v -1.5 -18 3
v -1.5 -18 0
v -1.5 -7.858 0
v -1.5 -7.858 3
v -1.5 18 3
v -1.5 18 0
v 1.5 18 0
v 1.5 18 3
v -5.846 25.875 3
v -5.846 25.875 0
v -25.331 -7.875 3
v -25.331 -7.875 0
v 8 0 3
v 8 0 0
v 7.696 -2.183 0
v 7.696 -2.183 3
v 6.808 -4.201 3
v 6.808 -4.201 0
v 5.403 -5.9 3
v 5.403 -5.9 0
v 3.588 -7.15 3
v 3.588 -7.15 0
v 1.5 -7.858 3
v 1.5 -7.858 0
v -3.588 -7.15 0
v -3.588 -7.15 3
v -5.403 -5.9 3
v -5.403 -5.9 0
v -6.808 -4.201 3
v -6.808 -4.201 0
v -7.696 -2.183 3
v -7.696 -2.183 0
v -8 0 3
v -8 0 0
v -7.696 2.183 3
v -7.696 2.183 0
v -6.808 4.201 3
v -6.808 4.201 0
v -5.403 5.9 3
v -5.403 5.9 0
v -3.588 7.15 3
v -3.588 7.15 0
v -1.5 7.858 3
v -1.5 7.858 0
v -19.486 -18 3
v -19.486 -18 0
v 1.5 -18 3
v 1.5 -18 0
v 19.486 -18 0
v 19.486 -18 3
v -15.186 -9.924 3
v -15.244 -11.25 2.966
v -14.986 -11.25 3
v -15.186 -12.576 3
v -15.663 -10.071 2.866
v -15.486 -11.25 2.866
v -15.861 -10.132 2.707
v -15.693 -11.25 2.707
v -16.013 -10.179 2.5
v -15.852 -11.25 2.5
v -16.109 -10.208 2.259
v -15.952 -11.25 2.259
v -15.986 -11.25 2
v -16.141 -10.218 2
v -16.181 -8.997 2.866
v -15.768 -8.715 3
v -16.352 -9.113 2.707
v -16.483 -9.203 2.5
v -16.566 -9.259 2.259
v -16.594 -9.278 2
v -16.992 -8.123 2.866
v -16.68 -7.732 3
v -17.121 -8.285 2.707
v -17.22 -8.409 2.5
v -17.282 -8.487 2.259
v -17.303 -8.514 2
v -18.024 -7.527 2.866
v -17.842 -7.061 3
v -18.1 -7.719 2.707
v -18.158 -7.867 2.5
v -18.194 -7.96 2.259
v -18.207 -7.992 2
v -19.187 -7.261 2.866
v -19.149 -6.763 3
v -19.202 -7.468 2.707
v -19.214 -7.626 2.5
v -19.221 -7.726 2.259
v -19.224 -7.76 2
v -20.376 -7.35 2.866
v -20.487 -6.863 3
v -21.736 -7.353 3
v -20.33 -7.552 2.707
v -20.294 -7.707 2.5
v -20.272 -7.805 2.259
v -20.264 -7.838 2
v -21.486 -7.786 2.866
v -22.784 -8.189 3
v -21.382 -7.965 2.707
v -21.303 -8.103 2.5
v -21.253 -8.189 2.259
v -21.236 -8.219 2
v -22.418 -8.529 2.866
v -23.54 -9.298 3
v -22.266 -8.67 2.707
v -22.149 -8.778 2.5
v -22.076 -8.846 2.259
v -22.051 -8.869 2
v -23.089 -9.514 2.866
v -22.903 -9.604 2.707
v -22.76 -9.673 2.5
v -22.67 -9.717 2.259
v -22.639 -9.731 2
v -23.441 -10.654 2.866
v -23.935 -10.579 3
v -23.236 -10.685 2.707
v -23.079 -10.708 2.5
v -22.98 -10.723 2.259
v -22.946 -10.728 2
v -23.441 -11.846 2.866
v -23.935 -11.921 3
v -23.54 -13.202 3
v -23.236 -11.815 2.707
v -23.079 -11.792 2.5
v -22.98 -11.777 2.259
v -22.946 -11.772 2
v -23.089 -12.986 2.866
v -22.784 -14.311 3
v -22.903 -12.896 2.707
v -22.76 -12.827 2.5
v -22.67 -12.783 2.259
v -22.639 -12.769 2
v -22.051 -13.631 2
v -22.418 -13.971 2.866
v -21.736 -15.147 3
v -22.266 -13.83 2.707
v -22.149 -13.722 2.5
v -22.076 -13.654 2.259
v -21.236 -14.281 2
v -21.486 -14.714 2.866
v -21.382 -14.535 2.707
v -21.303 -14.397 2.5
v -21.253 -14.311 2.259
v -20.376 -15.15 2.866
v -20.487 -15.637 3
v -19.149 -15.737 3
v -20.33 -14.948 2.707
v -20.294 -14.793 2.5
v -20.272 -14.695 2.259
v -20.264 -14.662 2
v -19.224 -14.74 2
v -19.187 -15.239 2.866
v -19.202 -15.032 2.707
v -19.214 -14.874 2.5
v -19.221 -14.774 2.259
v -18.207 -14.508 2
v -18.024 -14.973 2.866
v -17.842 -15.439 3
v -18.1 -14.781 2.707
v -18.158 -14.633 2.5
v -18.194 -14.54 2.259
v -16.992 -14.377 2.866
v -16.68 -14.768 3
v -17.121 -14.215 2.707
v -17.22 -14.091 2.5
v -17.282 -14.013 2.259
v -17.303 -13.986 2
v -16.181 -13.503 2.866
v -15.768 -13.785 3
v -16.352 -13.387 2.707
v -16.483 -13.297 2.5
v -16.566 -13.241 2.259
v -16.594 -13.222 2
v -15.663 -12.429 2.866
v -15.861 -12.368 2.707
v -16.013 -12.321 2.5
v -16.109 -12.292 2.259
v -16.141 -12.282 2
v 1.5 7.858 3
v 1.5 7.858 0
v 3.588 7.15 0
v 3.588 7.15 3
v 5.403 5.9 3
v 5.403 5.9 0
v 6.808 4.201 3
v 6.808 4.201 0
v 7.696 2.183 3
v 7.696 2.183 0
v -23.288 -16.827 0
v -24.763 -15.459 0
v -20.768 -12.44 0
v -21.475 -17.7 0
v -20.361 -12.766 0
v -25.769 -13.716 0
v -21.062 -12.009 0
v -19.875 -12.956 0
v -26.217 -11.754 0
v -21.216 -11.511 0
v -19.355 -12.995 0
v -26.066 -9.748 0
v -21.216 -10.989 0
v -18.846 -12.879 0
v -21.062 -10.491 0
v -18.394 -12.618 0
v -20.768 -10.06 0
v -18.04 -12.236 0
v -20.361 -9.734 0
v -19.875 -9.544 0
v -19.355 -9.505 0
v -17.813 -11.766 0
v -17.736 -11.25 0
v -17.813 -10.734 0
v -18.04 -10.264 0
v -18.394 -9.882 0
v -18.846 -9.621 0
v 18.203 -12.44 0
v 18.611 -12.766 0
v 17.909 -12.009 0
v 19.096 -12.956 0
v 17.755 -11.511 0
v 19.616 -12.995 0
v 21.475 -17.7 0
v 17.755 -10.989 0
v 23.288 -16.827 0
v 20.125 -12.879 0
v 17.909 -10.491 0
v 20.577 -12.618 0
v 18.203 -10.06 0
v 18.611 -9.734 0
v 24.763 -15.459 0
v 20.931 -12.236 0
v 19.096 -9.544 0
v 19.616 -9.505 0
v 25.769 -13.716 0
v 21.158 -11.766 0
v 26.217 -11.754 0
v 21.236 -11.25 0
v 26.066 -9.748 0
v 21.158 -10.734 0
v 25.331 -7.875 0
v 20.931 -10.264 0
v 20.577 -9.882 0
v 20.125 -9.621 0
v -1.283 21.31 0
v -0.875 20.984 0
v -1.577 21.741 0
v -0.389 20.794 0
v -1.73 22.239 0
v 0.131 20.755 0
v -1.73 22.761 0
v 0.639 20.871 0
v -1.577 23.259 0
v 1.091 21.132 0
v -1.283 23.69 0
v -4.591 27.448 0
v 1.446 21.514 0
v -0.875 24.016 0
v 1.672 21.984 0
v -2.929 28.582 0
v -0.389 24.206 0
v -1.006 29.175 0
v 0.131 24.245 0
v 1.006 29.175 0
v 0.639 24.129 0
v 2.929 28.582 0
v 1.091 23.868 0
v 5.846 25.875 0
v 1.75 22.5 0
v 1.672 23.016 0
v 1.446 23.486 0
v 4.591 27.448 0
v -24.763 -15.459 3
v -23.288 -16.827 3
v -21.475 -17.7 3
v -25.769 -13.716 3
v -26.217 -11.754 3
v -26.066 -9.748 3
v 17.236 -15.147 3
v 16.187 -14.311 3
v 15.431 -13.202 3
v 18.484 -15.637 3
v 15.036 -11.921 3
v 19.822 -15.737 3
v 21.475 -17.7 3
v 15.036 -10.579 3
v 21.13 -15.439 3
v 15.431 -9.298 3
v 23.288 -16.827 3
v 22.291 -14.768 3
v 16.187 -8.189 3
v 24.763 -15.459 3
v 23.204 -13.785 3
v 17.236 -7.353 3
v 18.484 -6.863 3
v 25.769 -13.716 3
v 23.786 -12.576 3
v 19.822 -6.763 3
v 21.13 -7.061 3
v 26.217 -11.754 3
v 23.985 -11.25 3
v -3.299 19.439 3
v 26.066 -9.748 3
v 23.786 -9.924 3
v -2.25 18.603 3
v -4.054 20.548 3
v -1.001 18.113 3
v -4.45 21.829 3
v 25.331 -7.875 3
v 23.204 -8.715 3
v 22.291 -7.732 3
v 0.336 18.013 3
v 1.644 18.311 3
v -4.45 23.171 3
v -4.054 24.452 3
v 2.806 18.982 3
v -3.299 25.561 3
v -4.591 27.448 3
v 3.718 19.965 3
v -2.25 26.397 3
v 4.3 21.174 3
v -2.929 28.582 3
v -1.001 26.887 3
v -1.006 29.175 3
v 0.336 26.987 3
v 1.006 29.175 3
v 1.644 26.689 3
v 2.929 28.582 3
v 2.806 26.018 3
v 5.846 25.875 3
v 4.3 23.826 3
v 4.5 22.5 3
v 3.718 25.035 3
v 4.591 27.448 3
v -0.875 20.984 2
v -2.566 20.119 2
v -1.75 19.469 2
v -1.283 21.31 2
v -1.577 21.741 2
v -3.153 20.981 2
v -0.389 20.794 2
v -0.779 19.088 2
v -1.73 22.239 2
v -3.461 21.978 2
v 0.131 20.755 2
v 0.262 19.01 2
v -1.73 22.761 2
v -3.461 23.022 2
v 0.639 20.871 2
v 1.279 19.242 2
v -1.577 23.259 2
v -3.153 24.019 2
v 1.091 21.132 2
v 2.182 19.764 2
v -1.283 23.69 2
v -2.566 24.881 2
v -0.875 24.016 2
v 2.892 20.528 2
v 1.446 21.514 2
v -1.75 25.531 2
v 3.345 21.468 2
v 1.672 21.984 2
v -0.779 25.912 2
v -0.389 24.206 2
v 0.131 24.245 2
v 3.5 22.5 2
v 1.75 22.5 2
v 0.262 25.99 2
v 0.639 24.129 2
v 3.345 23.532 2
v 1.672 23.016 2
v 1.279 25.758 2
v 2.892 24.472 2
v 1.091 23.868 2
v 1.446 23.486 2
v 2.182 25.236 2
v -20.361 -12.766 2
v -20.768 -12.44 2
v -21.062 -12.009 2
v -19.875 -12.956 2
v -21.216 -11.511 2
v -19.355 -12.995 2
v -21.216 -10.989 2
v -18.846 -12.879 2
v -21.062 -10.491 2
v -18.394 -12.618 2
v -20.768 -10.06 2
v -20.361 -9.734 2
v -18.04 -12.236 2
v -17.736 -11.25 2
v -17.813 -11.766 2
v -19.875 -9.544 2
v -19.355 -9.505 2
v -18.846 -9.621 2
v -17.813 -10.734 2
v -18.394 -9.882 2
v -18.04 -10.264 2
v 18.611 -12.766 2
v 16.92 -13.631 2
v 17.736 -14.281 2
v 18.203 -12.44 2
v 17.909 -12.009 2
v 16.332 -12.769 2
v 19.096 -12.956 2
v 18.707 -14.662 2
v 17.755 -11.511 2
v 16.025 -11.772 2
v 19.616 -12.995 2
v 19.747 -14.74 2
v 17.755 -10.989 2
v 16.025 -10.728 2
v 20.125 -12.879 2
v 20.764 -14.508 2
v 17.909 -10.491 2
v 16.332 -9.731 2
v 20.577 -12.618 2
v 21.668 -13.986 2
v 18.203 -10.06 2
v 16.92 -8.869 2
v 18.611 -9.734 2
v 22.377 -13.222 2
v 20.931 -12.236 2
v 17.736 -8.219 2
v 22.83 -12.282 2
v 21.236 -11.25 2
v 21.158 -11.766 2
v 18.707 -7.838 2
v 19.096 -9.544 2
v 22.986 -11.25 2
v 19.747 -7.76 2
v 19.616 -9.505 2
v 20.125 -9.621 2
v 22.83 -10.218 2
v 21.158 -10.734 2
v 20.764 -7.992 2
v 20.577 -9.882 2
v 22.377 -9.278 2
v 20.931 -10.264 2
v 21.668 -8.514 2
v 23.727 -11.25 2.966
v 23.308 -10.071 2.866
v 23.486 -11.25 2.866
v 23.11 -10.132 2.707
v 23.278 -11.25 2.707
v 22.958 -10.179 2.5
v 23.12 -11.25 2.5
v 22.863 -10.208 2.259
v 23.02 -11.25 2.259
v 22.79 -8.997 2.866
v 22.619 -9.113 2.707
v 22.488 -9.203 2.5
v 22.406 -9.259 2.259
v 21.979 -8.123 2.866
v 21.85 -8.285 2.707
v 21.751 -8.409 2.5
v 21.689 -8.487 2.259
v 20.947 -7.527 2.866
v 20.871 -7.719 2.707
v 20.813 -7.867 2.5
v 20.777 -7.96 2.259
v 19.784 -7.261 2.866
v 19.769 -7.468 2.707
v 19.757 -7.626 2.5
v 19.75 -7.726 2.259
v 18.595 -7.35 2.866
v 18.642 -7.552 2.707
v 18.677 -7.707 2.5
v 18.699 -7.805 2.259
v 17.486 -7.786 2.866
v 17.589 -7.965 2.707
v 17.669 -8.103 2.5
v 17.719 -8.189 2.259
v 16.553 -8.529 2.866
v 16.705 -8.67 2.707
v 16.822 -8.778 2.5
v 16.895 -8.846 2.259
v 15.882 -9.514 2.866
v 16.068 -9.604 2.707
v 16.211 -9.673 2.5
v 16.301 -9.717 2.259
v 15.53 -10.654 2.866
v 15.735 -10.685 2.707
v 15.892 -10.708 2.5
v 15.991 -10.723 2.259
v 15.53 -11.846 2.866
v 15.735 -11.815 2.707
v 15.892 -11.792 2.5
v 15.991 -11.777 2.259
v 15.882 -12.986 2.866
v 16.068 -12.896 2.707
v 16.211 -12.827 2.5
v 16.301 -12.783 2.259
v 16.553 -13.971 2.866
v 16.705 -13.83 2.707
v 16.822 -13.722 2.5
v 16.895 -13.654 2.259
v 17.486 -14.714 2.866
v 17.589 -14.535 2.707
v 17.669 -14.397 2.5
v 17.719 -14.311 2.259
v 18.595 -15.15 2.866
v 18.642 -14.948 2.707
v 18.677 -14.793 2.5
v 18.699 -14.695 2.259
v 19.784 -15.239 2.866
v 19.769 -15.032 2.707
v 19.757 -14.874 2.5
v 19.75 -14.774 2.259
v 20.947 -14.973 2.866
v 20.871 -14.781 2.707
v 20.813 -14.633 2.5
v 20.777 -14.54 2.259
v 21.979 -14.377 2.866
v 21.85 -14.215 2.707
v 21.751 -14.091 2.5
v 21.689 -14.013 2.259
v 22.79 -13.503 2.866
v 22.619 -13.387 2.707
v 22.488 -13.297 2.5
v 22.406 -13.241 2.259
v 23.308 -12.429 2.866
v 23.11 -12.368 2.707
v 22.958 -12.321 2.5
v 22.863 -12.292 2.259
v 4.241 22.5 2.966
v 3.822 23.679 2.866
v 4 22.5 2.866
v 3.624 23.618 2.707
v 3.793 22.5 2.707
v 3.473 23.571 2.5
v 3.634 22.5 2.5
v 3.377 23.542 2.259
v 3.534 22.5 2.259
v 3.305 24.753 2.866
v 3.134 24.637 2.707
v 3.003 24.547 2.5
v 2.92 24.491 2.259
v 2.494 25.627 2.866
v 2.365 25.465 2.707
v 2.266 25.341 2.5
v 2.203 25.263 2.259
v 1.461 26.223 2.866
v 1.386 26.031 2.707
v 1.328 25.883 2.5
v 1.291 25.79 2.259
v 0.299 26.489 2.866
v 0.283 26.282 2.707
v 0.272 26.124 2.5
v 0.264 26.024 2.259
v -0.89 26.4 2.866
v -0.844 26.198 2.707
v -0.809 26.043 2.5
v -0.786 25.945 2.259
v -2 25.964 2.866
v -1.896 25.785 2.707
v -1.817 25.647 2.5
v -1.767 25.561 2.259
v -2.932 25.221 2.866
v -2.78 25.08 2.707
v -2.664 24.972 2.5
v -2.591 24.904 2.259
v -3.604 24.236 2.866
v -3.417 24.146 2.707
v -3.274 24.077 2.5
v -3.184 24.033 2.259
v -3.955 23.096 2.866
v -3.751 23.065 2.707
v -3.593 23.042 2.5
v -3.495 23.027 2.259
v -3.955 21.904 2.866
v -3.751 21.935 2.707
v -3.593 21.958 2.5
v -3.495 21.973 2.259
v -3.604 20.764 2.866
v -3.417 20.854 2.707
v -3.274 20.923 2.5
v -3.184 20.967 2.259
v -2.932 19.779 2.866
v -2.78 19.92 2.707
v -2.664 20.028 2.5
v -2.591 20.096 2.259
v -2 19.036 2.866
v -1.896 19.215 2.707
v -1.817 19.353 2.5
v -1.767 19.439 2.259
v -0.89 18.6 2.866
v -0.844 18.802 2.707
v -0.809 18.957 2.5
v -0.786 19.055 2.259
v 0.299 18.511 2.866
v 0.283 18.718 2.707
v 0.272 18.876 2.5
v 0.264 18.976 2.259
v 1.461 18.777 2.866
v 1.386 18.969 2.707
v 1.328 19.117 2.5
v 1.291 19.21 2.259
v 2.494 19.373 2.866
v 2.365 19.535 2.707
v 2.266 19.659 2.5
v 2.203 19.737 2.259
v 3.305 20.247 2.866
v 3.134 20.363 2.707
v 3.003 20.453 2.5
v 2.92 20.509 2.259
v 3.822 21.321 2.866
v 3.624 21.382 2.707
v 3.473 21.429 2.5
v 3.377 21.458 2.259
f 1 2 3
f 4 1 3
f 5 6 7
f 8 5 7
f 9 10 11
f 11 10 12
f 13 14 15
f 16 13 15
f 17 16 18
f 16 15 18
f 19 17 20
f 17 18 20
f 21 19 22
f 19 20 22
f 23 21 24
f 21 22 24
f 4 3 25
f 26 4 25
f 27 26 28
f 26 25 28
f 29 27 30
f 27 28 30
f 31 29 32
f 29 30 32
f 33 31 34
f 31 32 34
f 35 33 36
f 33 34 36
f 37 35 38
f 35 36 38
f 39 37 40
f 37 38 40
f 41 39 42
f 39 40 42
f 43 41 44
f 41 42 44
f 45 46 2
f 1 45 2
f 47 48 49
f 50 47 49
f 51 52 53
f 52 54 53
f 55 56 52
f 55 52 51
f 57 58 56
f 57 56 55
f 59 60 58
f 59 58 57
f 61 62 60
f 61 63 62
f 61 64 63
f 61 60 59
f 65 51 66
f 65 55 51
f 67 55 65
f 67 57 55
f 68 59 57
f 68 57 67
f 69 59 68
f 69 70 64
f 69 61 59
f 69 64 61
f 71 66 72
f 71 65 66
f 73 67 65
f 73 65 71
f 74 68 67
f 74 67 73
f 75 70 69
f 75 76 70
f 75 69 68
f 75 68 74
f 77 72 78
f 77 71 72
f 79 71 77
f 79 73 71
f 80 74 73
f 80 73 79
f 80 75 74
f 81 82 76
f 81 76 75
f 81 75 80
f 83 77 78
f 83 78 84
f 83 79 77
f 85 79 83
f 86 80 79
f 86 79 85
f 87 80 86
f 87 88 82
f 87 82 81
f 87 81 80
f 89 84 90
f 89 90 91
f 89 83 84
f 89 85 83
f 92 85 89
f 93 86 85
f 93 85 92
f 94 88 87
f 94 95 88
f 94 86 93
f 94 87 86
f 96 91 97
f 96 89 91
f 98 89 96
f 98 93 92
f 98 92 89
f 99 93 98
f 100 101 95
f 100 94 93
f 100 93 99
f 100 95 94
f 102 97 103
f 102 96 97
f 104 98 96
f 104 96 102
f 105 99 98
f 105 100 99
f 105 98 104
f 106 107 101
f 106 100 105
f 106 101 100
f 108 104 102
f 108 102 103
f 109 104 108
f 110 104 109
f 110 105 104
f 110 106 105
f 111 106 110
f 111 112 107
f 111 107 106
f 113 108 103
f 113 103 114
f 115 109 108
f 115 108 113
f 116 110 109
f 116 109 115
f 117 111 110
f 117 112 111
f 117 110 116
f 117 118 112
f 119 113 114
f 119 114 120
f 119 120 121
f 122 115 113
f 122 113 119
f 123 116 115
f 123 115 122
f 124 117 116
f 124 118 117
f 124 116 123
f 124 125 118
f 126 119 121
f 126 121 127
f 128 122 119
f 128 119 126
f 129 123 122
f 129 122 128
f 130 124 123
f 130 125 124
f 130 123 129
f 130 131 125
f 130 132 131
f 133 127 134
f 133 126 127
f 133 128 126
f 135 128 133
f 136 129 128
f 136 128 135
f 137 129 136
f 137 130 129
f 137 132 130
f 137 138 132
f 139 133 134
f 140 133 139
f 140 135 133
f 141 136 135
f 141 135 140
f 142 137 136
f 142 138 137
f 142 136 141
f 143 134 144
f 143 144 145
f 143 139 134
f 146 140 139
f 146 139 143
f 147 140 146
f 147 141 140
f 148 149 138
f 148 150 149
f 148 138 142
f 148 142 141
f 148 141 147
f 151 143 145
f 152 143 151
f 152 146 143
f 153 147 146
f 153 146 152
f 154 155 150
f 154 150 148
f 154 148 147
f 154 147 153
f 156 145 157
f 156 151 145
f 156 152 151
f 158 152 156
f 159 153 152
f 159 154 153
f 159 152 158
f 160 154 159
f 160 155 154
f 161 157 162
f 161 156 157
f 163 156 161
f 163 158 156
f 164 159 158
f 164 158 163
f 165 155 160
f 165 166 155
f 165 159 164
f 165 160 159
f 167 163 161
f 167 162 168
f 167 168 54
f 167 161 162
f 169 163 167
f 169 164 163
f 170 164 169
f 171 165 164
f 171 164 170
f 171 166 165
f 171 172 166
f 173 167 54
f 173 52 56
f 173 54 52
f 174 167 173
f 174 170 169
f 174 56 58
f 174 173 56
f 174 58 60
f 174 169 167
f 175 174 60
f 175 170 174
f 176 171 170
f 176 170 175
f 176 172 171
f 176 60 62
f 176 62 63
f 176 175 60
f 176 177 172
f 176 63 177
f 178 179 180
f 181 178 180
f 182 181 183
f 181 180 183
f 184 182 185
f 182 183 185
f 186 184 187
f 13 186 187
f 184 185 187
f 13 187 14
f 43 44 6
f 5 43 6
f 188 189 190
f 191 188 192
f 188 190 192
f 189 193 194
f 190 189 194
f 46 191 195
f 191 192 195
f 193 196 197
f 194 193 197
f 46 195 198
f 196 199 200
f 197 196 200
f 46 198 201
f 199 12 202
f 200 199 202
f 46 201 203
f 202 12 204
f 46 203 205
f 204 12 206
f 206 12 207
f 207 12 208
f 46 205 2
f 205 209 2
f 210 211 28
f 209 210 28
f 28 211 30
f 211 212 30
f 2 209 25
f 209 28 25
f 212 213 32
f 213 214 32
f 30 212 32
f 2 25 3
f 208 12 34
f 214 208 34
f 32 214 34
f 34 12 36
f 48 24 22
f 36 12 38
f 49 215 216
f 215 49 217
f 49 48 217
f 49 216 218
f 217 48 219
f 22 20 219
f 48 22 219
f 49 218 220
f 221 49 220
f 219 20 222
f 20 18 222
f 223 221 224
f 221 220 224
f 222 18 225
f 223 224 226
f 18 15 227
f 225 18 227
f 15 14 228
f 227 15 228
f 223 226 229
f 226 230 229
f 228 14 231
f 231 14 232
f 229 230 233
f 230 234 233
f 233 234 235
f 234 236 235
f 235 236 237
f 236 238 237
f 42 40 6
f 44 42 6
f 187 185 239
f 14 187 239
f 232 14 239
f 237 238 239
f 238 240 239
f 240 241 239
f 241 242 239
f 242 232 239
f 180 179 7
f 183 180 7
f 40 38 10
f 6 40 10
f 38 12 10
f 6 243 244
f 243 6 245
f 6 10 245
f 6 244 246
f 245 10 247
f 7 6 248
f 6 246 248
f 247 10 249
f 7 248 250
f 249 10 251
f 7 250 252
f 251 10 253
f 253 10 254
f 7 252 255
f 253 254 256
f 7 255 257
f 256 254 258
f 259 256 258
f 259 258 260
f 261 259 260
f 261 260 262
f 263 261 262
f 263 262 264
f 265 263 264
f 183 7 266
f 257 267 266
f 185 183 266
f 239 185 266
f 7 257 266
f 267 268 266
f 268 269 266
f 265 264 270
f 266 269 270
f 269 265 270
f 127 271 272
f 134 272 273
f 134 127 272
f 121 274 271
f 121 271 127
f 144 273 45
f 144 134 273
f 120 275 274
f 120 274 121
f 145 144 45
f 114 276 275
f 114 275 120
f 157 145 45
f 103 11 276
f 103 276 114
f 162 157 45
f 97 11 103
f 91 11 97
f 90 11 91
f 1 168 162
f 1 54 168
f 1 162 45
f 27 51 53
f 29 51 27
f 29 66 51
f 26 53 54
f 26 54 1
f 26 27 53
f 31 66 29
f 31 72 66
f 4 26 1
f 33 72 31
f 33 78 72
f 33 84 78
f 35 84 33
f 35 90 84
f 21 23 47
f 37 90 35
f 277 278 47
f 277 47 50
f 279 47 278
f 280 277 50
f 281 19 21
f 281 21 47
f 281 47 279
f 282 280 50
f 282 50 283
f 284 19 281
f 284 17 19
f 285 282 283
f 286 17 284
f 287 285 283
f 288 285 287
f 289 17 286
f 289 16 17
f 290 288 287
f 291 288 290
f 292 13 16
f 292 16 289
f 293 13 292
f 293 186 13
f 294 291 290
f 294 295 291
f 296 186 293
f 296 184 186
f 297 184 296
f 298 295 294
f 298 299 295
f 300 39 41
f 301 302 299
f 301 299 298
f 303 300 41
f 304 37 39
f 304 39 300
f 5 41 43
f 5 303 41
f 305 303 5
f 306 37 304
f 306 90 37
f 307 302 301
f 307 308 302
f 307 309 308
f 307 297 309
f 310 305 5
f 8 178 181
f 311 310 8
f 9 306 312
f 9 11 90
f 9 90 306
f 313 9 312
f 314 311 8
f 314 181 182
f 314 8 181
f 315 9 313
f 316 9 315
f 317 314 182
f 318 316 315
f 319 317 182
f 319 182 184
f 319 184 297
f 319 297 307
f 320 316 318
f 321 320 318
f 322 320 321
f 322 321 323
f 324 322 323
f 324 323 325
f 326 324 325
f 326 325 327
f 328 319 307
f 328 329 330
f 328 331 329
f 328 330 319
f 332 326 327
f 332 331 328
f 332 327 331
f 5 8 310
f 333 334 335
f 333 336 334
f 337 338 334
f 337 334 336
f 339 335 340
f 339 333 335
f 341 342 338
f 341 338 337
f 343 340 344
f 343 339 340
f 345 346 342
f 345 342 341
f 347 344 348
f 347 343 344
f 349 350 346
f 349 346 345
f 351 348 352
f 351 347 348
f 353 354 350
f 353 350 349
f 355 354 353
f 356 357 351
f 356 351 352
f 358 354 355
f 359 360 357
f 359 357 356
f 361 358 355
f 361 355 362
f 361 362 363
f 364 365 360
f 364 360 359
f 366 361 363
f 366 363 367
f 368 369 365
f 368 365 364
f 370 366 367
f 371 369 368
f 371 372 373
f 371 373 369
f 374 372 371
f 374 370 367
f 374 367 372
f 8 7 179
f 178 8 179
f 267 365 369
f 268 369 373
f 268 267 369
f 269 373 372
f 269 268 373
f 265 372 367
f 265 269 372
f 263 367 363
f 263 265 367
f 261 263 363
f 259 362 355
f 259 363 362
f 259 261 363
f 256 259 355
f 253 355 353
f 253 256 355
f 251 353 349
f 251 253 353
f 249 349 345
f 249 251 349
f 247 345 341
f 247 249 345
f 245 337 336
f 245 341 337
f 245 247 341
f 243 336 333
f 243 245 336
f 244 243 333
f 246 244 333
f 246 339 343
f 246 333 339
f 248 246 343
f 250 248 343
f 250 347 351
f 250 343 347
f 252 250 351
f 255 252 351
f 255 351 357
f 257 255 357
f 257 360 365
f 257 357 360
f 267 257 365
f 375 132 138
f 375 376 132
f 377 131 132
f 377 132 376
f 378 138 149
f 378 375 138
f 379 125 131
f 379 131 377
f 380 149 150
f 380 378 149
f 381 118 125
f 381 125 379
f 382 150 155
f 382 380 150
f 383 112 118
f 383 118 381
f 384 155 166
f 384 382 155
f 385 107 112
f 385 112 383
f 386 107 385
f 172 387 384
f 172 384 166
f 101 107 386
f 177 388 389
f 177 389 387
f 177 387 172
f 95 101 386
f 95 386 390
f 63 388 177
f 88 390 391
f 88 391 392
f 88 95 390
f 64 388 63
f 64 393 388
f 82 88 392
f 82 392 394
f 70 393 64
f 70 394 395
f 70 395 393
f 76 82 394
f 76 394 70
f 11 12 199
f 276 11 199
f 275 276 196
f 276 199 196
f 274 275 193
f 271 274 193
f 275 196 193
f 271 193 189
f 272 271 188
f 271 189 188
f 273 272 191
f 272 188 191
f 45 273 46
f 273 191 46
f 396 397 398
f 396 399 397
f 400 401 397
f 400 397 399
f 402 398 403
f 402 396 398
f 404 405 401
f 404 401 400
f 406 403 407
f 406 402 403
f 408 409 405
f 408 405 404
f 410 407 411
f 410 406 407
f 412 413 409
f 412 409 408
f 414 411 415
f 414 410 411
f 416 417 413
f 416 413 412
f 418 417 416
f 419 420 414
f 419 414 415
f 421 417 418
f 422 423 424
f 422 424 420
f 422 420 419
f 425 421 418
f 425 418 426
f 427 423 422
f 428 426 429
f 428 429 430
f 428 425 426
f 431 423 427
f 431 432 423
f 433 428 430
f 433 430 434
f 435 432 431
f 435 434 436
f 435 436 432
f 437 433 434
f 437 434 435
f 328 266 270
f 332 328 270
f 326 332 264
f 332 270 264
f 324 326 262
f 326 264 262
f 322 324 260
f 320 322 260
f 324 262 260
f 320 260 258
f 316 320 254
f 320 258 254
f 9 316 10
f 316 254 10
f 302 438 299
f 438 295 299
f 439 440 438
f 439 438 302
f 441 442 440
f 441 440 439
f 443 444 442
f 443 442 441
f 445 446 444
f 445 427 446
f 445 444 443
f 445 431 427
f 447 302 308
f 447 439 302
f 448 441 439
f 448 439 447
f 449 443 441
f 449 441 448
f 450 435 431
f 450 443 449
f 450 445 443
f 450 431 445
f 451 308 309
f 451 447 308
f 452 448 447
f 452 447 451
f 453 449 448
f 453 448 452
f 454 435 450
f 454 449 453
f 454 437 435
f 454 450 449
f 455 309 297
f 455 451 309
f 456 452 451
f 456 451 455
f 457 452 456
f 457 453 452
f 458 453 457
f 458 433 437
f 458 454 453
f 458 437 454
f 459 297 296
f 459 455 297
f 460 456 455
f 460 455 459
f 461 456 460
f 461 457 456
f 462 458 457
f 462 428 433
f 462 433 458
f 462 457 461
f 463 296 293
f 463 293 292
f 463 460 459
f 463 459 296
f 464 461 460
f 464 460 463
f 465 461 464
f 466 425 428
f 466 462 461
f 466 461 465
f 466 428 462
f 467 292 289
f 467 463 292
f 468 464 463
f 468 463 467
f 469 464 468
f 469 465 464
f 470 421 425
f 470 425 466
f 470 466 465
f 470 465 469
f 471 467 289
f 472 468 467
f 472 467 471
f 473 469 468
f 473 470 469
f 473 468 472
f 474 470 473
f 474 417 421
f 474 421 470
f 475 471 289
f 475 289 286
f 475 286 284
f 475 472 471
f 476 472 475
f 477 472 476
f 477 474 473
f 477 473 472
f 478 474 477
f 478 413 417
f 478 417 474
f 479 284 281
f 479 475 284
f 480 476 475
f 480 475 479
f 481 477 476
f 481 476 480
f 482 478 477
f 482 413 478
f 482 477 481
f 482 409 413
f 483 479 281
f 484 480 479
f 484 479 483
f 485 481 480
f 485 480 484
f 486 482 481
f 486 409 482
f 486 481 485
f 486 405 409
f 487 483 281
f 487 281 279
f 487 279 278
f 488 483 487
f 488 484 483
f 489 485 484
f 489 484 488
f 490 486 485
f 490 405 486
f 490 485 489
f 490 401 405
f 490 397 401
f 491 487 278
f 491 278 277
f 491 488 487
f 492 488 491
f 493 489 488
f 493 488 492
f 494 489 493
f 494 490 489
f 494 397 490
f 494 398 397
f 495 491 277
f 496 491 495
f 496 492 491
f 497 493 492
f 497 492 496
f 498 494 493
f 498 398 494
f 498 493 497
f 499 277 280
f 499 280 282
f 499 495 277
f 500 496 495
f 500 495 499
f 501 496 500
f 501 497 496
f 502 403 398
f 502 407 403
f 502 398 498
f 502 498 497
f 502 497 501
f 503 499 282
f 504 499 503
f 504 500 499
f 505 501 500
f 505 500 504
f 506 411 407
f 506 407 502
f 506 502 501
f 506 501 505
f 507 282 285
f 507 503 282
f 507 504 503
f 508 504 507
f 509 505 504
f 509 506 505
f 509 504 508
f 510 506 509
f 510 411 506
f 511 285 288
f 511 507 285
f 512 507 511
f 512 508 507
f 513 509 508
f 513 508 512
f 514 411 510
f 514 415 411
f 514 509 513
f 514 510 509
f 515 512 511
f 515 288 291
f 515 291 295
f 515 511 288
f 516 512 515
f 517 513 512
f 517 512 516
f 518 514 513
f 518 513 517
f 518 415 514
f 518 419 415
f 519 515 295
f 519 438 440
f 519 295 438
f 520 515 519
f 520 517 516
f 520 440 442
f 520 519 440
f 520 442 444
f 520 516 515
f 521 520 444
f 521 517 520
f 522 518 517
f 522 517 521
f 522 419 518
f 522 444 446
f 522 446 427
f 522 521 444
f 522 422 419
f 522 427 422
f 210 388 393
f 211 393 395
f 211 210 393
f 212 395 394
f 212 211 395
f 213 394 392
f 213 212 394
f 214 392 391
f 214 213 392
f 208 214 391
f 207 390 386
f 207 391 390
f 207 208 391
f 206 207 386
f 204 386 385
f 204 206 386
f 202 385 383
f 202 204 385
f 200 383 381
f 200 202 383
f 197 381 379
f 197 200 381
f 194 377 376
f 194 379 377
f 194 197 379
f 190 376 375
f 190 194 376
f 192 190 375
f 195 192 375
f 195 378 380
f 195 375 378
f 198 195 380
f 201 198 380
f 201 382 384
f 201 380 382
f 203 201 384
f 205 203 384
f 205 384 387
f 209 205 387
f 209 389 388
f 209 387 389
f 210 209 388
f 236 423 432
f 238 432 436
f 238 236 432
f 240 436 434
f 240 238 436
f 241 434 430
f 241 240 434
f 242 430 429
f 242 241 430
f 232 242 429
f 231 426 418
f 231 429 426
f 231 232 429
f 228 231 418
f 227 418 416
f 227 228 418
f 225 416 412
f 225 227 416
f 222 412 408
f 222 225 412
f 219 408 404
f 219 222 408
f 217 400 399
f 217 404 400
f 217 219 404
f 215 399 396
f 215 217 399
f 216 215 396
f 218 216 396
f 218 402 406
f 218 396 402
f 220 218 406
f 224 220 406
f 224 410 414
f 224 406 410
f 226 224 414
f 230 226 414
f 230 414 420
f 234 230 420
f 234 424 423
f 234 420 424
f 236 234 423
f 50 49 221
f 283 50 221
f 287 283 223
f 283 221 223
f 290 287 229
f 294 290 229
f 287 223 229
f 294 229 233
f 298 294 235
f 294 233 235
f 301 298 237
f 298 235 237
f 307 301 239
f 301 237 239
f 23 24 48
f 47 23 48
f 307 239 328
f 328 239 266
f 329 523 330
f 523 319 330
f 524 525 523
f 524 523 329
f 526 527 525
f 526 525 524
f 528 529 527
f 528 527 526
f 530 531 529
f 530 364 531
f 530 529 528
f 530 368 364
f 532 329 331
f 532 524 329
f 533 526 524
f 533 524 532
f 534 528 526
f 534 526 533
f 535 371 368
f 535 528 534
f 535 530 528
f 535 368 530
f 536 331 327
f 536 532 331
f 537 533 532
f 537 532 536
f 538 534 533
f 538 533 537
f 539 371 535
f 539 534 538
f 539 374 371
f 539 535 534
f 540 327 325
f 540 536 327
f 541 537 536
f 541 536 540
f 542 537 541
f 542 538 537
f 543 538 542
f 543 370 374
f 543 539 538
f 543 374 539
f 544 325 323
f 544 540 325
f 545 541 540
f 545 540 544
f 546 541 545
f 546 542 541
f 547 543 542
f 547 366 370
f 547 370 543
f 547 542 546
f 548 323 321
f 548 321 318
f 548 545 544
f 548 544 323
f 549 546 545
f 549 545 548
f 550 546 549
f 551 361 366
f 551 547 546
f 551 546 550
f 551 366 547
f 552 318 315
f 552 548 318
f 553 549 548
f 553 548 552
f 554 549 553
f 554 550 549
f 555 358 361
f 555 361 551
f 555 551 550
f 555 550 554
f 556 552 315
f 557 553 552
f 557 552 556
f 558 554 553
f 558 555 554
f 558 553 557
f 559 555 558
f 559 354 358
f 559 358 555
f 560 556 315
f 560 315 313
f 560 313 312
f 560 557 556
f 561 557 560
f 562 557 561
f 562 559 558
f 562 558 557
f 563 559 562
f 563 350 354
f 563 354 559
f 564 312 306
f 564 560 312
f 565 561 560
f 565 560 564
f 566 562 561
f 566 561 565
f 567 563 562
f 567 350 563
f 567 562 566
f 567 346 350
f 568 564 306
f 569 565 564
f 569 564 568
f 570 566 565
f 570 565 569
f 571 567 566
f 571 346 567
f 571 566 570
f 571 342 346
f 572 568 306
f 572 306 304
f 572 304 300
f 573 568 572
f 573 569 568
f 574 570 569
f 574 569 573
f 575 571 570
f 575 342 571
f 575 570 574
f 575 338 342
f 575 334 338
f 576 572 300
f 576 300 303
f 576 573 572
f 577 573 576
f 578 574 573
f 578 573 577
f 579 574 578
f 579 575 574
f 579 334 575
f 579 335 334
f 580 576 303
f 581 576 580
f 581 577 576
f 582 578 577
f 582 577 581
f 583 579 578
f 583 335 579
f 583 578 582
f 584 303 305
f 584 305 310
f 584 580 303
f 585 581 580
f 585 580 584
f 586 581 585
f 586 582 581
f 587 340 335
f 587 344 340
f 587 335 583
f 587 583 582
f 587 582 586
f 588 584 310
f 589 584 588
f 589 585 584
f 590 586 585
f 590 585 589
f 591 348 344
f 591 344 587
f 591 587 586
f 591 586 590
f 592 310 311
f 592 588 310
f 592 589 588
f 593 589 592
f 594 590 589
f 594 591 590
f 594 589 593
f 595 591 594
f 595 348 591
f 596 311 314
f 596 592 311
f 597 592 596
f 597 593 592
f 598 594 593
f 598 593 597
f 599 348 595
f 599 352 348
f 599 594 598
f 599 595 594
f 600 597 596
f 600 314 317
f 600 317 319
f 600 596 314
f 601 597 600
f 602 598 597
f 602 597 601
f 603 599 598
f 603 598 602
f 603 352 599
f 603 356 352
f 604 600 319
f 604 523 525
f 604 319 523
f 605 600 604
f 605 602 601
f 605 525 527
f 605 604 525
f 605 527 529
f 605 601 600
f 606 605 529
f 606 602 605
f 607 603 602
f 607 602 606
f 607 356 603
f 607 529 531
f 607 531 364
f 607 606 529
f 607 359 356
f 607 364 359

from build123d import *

# Parameters (mm, degrees)
SKETCH1_R           = 1.75
BOSS_EXTRUDE1_DEPTH = 3
SKETCH2_R           = 3.5
CUT_EXTRUDE1_DEPTH  = 1
FILLET1_R           = 1


with BuildPart() as part:
    # Sketch1 → Boss-Extrude1 (new body)
    with BuildSketch(Plane.XY):
        with BuildLine():
            Line((-5.845671476, 25.875), (-25.331243061, -7.875))
            ThreePointArc((-25.331243061, -7.875), (-25.331243061, -14.625), (-19.485571585, -18))
            Line((-19.485571585, -18), (-1.5, -18))
            Line((-1.5, -18), (-1.5, -7.858116823))
            ThreePointArc((-1.5, -7.858116823), (-8, 0), (-1.5, 7.858116823))
            Line((-1.5, 7.858116823), (-1.5, 18))
            Line((-1.5, 18), (1.5, 18))
            Line((1.5, 18), (1.5, 7.858116823))
            ThreePointArc((1.5, 7.858116823), (6.164414003, 5.099019514), (8, 0))
            ThreePointArc((8, 0), (6.164414003, -5.099019514), (1.5, -7.858116823))
            Line((1.5, -7.858116823), (1.5, -18))
            Line((1.5, -18), (19.485571585, -18))
            ThreePointArc((19.485571585, -18), (25.331243061, -14.625), (25.331243061, -7.875))
            Line((25.331243061, -7.875), (5.845671476, 25.875))
            ThreePointArc((5.845671476, 25.875), (0, 29.25), (-5.845671476, 25.875))
        make_face()
        with Locations((-19.485571585, -11.25)):
            Circle(SKETCH1_R, mode=Mode.SUBTRACT)
        with Locations((19.485571585, -11.25)):
            Circle(SKETCH1_R, mode=Mode.SUBTRACT)
        with Locations((0, 22.5)):
            Circle(SKETCH1_R, mode=Mode.SUBTRACT)
    extrude(amount=BOSS_EXTRUDE1_DEPTH)

    # Sketch2 → Cut-Extrude1 (cut)
    with BuildSketch(Plane.XY.offset(3)):
        with Locations((0, 22.5)):
            Circle(SKETCH2_R)
        with Locations((19.485571585, -11.25)):
            Circle(SKETCH2_R)
        with Locations((-19.485571585, -11.25)):
            Circle(SKETCH2_R)
    extrude(amount=-CUT_EXTRUDE1_DEPTH, mode=Mode.SUBTRACT)

    # Fillet1
    fillet1_edges = [part.edges().sort_by_distance(p)[0] for p in [
        (-3.5, 22.5, 3),
        (15.985571585, -11.25, 3),
        (-22.985571585, -11.25, 3),
    ]]
    fillet(fillet1_edges, radius=FILLET1_R - 0.0001)  # a hair under: the kernel refuses the full size


solid = part.part
